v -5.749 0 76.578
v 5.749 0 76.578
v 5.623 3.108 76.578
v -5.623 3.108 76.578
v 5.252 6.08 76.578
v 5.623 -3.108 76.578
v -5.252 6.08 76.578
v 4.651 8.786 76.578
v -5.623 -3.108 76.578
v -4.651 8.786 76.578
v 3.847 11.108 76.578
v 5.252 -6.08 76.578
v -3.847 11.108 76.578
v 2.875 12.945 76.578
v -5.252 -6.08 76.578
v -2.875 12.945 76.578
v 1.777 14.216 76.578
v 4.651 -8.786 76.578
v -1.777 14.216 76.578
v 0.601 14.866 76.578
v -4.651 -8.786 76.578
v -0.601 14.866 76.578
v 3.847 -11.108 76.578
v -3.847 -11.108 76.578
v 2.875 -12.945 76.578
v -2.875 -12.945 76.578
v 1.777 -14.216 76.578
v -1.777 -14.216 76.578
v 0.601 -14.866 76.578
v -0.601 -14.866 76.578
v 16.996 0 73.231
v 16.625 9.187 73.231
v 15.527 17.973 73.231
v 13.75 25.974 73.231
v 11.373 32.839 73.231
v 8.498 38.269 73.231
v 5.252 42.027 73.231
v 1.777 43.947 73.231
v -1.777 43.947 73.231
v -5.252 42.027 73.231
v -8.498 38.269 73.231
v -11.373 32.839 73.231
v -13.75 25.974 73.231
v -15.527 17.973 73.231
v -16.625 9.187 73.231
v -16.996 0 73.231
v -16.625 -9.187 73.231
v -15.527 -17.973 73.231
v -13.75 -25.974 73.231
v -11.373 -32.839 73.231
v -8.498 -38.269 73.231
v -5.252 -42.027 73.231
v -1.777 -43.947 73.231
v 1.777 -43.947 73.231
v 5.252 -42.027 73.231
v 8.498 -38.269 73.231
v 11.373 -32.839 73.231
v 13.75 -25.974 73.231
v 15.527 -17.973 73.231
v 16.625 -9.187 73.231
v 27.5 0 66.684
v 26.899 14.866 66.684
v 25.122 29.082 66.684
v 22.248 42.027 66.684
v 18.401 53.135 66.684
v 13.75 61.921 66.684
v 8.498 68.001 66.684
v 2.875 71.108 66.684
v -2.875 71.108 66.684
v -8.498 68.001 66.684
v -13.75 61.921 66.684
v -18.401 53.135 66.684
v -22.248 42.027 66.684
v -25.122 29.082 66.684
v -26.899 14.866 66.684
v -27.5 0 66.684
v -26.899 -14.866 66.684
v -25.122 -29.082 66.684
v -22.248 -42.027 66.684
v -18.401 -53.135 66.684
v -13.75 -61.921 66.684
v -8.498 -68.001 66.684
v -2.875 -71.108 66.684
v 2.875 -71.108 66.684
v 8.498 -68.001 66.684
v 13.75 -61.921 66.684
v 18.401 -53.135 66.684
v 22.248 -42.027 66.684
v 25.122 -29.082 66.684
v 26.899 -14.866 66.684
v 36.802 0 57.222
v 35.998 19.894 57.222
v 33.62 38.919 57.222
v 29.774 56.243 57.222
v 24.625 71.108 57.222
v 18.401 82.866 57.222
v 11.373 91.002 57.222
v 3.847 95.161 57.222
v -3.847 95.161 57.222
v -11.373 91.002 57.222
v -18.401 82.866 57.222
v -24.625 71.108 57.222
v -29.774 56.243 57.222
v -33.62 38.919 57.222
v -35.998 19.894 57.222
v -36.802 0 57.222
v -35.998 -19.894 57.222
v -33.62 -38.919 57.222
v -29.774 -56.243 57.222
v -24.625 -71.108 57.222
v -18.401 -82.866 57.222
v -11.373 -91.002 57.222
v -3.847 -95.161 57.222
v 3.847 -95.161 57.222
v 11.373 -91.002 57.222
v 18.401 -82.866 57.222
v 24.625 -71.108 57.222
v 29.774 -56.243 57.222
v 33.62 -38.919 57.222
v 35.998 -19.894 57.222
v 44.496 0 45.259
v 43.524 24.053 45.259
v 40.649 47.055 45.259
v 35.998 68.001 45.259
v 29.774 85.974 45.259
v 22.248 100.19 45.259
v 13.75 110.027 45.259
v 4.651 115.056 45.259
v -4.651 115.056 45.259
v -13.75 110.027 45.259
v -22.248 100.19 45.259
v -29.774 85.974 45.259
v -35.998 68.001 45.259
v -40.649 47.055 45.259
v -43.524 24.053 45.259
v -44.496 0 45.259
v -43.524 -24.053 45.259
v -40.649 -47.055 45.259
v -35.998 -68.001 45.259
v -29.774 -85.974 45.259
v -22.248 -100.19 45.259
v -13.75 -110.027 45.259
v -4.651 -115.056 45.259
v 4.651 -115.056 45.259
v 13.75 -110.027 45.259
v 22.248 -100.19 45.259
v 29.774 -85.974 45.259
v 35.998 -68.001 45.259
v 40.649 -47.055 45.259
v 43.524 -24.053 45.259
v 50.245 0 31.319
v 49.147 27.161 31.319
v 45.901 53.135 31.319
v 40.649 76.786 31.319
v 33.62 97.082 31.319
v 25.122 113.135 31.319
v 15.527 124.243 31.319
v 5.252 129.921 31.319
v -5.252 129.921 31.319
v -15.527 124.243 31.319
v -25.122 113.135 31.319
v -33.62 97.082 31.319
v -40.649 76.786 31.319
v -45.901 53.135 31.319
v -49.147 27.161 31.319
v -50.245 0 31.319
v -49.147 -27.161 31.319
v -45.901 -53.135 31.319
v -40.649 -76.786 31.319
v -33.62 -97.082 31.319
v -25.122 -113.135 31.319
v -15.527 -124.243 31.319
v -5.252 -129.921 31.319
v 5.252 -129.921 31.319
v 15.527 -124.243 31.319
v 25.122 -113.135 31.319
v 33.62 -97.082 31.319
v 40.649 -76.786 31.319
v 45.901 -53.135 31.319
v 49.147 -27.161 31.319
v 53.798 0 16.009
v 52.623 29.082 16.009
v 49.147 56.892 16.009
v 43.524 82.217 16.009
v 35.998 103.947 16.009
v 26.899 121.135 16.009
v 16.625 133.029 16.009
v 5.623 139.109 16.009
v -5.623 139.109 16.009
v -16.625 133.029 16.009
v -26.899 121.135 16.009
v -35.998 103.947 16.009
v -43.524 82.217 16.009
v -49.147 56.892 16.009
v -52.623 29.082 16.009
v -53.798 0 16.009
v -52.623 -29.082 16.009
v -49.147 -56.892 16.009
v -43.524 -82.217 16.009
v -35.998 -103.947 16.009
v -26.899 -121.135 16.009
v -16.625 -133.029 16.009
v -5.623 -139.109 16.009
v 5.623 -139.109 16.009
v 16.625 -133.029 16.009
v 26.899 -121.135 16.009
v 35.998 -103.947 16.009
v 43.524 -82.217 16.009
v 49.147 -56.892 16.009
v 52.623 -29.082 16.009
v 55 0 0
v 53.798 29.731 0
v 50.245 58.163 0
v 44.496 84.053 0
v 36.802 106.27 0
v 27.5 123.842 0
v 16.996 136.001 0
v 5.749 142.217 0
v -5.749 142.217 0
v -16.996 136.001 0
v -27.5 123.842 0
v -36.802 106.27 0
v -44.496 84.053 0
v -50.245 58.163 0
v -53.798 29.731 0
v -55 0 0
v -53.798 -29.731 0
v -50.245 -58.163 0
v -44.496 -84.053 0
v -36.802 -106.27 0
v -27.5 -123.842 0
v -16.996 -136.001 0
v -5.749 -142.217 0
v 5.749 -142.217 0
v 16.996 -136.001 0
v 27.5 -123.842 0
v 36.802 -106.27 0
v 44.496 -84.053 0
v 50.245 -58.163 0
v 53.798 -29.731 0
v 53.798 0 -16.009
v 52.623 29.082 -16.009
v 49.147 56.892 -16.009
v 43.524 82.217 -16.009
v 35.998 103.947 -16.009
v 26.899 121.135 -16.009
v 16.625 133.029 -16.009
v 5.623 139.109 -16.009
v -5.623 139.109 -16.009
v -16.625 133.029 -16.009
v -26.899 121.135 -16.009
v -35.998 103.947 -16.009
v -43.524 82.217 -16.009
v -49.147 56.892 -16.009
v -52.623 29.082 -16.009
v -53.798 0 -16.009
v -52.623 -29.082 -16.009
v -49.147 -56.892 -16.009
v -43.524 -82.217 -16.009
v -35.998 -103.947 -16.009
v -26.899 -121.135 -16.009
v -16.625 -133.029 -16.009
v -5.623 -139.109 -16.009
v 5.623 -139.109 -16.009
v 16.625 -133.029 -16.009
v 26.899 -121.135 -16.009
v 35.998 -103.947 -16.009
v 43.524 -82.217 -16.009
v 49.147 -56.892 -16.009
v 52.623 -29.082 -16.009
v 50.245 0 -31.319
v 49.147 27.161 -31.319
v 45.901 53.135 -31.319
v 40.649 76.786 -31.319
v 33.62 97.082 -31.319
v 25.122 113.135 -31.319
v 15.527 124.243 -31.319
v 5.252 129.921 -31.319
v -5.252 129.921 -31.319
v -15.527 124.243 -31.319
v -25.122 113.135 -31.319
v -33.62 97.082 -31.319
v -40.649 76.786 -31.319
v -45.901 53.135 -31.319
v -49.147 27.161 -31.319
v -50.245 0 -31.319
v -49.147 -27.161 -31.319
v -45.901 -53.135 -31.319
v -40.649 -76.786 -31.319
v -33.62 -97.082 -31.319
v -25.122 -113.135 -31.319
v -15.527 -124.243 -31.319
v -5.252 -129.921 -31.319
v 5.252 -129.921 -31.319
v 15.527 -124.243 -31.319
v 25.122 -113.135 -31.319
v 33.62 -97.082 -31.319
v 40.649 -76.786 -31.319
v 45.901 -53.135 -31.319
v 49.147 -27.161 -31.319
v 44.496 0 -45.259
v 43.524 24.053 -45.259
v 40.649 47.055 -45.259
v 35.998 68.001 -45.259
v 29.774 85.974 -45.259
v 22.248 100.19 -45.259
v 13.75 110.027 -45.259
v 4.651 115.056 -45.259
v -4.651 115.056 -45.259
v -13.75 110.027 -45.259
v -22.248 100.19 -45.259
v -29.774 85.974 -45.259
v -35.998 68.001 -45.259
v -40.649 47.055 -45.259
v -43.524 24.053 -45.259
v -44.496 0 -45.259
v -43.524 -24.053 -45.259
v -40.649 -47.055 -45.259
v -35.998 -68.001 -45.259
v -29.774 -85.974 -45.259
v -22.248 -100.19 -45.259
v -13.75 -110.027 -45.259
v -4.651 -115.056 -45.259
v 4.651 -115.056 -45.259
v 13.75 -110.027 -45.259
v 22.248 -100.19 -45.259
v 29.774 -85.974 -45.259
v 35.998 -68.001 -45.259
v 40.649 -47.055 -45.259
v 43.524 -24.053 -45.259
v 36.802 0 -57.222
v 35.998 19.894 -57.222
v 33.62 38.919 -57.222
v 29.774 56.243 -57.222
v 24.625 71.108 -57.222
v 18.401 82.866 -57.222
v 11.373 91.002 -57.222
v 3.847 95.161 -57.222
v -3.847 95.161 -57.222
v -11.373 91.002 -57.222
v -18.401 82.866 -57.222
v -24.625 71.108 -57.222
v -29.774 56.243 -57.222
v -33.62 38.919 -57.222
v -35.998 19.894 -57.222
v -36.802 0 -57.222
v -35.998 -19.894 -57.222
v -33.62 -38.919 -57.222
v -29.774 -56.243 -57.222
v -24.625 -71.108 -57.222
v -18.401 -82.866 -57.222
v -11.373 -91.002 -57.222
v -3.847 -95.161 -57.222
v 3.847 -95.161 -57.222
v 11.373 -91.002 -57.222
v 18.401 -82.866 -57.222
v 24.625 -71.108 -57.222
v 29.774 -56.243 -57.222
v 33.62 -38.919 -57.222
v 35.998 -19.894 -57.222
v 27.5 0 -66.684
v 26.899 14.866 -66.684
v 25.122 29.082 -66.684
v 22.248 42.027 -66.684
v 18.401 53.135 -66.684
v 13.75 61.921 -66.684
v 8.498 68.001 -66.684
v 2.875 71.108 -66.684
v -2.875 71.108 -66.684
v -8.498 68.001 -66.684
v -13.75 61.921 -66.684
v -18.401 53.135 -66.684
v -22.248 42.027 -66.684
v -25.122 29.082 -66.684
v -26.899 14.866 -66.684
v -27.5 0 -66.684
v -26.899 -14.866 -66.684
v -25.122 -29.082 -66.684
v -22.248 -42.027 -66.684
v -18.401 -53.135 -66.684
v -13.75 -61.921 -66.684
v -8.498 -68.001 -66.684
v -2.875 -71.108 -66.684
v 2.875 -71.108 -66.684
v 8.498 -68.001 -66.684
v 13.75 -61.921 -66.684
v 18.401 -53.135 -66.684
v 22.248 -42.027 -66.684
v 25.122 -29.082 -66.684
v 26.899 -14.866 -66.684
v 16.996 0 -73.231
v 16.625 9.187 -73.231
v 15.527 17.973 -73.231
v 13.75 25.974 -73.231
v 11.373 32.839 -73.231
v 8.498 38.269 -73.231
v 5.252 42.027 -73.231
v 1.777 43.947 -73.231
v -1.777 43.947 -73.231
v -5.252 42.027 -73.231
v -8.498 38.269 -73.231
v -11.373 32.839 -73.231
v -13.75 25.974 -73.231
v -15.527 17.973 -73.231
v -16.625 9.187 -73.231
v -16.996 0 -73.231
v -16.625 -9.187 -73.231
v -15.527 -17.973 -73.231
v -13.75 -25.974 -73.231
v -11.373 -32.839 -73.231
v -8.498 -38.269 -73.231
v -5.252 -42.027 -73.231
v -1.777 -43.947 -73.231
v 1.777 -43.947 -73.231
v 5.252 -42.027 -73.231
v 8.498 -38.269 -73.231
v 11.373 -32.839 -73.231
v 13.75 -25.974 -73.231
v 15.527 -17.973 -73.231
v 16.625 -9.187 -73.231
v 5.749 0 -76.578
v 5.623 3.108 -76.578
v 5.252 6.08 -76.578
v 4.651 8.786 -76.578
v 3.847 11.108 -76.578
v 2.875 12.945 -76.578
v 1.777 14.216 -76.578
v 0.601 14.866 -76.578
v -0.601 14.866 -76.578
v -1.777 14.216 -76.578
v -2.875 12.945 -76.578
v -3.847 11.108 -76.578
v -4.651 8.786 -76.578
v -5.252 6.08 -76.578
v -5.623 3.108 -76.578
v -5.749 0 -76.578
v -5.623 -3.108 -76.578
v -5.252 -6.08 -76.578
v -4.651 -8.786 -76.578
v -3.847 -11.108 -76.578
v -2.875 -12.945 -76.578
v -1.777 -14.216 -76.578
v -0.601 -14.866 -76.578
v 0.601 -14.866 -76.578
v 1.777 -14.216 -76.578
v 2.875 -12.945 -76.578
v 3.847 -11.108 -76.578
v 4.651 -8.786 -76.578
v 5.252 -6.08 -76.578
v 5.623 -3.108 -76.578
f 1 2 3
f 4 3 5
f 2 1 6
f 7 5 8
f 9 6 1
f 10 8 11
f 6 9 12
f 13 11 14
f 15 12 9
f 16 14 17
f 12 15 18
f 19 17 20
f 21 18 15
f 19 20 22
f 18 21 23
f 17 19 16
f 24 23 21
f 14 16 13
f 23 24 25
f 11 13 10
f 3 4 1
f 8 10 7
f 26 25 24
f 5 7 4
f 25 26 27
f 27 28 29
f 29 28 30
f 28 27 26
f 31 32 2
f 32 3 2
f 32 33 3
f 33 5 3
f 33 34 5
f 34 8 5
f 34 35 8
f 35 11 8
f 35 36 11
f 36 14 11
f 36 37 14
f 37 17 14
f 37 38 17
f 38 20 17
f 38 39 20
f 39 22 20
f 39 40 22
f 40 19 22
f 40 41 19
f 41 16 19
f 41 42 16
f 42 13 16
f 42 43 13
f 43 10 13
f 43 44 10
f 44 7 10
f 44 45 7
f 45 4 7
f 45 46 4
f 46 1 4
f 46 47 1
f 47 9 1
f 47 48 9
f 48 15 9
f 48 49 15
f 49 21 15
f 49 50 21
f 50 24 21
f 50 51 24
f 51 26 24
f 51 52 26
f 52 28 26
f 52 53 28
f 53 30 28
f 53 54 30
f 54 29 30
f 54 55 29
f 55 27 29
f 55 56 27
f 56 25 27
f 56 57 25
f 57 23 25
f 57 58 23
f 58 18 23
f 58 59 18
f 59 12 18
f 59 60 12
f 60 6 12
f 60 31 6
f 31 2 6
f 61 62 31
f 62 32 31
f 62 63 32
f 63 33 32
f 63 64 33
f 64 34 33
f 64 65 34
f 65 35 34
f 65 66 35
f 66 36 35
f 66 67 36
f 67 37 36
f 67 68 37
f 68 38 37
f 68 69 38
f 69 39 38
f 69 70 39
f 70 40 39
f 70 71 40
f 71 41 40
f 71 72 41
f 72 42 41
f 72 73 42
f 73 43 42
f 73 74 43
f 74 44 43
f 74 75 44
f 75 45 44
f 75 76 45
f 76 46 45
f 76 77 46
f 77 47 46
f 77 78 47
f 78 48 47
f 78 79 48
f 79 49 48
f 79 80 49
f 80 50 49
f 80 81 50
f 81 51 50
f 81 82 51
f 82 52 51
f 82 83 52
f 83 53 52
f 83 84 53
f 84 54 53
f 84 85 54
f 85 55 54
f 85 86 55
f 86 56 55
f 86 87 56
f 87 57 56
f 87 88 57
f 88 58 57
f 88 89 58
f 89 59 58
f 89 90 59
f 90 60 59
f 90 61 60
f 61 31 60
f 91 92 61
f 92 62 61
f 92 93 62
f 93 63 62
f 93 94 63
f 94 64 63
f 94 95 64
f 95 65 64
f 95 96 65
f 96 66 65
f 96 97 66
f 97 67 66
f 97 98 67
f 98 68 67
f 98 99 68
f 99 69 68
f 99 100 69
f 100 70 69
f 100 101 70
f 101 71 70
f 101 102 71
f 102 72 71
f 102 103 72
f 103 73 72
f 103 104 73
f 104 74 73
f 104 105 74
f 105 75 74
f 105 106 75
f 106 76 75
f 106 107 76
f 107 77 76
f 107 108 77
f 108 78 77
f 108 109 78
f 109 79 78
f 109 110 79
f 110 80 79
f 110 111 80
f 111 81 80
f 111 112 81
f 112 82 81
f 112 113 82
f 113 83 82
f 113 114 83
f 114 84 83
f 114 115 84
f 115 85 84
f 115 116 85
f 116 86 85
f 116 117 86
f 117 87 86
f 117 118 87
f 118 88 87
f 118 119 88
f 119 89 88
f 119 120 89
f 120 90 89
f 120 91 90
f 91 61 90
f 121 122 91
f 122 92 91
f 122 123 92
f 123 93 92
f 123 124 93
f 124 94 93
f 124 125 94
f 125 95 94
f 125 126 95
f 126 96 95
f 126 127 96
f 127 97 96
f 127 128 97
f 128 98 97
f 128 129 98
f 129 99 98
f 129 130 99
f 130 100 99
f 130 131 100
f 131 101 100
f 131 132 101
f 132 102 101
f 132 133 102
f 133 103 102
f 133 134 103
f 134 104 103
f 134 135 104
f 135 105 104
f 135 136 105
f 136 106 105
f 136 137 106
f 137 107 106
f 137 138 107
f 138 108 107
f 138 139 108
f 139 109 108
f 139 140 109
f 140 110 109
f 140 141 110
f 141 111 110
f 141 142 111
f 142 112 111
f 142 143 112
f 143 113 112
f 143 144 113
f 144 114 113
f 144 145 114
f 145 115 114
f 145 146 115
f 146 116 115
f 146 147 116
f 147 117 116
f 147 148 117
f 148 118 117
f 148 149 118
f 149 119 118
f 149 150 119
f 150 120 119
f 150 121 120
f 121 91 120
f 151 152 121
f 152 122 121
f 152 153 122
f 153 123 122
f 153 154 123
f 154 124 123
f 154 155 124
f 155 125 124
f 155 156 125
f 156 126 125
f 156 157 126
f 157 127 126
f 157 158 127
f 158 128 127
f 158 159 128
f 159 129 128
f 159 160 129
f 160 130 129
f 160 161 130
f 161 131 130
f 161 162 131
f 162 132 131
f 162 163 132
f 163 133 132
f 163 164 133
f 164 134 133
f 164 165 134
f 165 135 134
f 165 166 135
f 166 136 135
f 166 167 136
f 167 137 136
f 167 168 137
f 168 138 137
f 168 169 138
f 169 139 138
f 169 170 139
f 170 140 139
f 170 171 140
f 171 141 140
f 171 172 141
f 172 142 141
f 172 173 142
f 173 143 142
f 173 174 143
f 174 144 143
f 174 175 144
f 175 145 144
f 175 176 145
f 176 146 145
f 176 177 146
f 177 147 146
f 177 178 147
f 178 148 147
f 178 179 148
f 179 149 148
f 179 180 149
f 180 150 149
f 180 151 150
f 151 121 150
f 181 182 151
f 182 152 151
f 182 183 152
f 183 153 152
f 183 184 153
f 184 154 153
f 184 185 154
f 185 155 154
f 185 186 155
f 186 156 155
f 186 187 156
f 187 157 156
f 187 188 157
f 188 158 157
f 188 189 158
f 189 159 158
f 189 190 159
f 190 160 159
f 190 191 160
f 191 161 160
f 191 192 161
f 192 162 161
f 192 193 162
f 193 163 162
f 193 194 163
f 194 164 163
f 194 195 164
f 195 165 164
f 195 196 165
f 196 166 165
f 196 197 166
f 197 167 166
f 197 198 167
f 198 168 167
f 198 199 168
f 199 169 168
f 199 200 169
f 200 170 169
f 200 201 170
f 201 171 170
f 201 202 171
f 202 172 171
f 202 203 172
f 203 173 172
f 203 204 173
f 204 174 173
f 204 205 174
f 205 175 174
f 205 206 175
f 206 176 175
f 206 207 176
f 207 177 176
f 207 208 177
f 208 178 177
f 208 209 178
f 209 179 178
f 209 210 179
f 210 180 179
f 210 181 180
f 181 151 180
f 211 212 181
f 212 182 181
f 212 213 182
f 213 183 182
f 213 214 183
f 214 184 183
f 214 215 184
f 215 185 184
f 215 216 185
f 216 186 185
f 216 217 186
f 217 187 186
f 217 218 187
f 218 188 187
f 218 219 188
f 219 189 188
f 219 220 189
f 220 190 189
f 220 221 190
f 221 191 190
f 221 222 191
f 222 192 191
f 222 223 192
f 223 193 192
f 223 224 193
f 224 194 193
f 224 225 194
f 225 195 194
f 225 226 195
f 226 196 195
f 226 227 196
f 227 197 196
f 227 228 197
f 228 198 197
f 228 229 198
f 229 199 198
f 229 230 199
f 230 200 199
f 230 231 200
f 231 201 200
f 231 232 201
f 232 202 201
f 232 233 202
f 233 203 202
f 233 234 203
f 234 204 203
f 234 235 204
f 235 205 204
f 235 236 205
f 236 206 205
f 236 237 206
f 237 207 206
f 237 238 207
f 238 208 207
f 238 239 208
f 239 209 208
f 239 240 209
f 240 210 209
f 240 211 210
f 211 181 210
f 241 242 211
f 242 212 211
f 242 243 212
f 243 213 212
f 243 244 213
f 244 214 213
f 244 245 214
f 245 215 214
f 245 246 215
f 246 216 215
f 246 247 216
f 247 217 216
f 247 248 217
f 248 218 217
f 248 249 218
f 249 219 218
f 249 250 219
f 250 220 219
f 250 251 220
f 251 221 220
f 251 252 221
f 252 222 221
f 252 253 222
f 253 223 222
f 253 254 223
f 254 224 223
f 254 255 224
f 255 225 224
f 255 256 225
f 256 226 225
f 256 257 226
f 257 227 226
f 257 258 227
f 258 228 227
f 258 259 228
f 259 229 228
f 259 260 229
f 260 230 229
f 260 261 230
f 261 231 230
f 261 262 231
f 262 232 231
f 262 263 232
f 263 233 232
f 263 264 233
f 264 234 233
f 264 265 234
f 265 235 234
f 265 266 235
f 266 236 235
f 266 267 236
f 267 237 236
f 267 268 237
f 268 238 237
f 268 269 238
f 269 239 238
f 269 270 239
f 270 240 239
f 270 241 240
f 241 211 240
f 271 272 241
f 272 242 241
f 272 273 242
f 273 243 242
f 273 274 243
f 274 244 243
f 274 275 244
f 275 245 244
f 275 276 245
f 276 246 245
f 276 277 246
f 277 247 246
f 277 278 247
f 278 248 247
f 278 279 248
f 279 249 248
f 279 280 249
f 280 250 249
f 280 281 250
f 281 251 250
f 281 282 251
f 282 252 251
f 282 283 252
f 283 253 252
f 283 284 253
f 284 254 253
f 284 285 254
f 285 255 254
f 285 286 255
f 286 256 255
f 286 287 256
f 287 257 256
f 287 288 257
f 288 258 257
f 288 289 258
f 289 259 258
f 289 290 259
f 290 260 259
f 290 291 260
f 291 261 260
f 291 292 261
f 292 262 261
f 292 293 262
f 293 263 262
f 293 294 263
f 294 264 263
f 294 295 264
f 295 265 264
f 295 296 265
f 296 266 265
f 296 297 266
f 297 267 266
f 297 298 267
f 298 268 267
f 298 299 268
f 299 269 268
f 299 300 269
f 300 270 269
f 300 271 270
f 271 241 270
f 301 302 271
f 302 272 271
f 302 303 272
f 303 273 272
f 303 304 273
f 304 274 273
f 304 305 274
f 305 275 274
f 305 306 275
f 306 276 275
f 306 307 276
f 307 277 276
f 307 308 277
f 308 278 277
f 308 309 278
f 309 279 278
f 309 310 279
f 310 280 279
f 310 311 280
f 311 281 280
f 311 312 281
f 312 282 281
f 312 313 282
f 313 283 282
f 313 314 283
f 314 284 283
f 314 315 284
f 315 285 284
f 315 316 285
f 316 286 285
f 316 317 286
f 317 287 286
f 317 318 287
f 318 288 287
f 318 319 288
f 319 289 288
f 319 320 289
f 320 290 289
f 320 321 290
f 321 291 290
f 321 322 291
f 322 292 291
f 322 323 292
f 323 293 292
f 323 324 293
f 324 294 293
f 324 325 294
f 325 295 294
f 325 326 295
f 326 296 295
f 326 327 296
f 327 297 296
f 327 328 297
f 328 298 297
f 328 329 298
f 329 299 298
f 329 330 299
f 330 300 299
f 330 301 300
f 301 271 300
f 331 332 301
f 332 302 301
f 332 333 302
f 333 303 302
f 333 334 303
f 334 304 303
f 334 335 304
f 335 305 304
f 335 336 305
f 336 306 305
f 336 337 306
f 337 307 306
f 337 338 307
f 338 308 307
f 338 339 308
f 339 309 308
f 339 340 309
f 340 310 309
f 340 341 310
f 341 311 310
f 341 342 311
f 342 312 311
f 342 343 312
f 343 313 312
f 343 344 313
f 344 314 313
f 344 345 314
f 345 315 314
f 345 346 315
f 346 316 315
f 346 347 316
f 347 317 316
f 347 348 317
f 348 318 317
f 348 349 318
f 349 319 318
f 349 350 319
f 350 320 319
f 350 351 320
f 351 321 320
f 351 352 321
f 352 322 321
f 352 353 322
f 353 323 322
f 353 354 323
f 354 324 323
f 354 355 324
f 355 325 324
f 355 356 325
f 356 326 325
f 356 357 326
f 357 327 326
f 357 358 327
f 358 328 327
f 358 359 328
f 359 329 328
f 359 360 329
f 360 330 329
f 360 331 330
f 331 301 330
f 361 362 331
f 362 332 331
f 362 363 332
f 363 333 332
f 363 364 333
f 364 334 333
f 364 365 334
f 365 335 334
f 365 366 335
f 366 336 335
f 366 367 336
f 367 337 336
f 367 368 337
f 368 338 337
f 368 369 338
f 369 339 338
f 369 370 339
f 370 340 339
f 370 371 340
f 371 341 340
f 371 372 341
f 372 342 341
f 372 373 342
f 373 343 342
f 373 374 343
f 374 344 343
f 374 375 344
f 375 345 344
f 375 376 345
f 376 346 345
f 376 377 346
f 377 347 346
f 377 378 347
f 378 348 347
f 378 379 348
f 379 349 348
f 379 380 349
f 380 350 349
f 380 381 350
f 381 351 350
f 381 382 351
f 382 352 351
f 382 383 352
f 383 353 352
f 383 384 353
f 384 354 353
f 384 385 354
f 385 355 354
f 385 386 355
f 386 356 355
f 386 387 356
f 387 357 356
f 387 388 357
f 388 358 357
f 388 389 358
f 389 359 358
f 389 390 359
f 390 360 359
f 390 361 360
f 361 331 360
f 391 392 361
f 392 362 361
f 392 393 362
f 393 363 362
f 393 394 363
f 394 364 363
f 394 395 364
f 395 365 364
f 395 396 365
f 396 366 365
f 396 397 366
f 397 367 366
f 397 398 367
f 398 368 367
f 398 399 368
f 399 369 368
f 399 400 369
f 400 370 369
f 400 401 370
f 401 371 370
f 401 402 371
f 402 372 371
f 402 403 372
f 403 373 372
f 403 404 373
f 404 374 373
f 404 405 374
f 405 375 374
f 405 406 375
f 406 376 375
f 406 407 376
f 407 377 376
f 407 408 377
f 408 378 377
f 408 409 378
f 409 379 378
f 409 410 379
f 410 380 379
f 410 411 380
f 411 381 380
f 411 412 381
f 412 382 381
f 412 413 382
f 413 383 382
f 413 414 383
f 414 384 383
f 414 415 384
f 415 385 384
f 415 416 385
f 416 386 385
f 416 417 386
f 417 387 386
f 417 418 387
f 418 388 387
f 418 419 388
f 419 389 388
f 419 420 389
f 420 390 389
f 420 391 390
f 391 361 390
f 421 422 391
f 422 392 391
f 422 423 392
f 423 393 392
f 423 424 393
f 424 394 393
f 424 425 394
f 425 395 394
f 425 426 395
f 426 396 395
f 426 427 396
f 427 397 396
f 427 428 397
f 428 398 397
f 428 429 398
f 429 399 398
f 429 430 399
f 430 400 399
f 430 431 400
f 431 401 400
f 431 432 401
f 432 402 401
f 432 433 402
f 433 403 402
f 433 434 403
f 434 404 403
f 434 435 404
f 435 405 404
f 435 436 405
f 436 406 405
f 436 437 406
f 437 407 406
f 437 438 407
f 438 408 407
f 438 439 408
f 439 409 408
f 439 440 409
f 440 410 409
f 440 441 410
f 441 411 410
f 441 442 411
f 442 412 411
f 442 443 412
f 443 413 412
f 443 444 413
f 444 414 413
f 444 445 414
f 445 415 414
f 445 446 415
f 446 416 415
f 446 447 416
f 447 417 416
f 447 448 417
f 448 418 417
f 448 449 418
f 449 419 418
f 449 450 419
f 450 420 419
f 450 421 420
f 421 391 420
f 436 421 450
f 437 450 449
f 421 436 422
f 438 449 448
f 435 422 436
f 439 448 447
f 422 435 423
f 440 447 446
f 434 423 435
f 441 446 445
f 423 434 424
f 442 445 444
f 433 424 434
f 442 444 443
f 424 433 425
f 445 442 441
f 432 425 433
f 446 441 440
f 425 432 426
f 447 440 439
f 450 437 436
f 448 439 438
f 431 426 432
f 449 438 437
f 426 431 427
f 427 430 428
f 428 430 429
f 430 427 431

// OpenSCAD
// Generated by SolidPython 1.0.1 on 2020-07-29 00:46:46


scale(v = [5, 13, 7]) {
	sphere(r = 11);
}
/***********************************************
*********      SolidPython code:      **********
************************************************
 
# import packages: SolidPython
from solid import *
from solid.utils import *
from itertools import chain, combinations, permutations


class Resize:

    def __init__(self, scad_file):
        self.scad_file = scad_file
        #self.scad_file = import_scad(scad_file)
        # cone/cylinder param:
        self.r1 = 0
        self.r2 = 0
        self.h = 0
        # rectangular prism param:
        self.w = 0
        self.l = 0
        # ellipse param:
        self.r = 0

    # import OpenScad code (file name corresponds to shape)


    # classify shape + parameters
    def assign(self, param1, param2, param3):
        if self.scad_file == 'cone.scad':
            self.r1 = param1
            self.r2 = param2
            self.h = param3
        elif self.scad_file == 'cylinder.scad':
            self.r1 = param1
            self.r2 = param2
            self.h = param3
        elif self.scad_file == 'rectangularPrism.scad':
            self.h = param1
            self.l = param2
            self.w = param3
        else:
            self.r = param1
            self.h = param2

    # resize parameters
    def iterate(self):
        x = range(3, 20, 2)
        i = 1
        if self.scad_file == 'cone.scad':
            tempList = list(permutations(x, 2))
            for temp in tempList:
                param1 = temp[0]
                param2 = temp[1]
                filepath = 'produced_scad_files/' + 'cone' + str(param1) + '_' + str(param2) + '_' + '.scad'
                scad_render_to_file(cylinder(h=param1, r1=param2, r2=0), filepath)

        elif self.scad_file == 'cylinder.scad':
            tempList = list(permutations(x, 3))
            for temp in tempList:
                param1 = temp[0]
                param2 = temp[1]
                filepath = 'produced_scad_files/' + 'cylinder' + str(param1) + '_' + str(param2) + '_' + '.scad'
                scad_render_to_file(cylinder(h=param1, r1=param2, r2=param2), filepath)

        elif self.scad_file == 'rectangularPrism.scad':
            tempList = list(permutations(x, 3))
            for temp in tempList:
                param1 = temp[0]
                param2 = temp[1]
                param3 = temp[2]
                filepath = 'produced_scad_files/' + 'rectangularPrism' + str(param1) + '_' + str(param2) + '_' + str(
                    param3) + '.scad'
                scad_render_to_file(cube(size=(param1, param2, param3)), filepath)

        elif self.scad_file == 'ellipse.scad':
            tempList = list(permutations(x, 4))
            for temp in tempList:
                param1 = temp[0]
                param2 = temp[1]
                param3 = temp[2]
                param4 = temp[3]
                filepath = 'produced_scad_files/' + 'ellipse' + str(param1) + '_' + str(param2) + '_' + str(param3) + '_' + str(param4) + '.scad'
                scad_render_to_file(scale([param1, param2, param3])(sphere(r=param4)), filepath)

    def render_to_scadfile(self):
        scad_render_to_file(scad, 'example.scad') 
 
************************************************/
